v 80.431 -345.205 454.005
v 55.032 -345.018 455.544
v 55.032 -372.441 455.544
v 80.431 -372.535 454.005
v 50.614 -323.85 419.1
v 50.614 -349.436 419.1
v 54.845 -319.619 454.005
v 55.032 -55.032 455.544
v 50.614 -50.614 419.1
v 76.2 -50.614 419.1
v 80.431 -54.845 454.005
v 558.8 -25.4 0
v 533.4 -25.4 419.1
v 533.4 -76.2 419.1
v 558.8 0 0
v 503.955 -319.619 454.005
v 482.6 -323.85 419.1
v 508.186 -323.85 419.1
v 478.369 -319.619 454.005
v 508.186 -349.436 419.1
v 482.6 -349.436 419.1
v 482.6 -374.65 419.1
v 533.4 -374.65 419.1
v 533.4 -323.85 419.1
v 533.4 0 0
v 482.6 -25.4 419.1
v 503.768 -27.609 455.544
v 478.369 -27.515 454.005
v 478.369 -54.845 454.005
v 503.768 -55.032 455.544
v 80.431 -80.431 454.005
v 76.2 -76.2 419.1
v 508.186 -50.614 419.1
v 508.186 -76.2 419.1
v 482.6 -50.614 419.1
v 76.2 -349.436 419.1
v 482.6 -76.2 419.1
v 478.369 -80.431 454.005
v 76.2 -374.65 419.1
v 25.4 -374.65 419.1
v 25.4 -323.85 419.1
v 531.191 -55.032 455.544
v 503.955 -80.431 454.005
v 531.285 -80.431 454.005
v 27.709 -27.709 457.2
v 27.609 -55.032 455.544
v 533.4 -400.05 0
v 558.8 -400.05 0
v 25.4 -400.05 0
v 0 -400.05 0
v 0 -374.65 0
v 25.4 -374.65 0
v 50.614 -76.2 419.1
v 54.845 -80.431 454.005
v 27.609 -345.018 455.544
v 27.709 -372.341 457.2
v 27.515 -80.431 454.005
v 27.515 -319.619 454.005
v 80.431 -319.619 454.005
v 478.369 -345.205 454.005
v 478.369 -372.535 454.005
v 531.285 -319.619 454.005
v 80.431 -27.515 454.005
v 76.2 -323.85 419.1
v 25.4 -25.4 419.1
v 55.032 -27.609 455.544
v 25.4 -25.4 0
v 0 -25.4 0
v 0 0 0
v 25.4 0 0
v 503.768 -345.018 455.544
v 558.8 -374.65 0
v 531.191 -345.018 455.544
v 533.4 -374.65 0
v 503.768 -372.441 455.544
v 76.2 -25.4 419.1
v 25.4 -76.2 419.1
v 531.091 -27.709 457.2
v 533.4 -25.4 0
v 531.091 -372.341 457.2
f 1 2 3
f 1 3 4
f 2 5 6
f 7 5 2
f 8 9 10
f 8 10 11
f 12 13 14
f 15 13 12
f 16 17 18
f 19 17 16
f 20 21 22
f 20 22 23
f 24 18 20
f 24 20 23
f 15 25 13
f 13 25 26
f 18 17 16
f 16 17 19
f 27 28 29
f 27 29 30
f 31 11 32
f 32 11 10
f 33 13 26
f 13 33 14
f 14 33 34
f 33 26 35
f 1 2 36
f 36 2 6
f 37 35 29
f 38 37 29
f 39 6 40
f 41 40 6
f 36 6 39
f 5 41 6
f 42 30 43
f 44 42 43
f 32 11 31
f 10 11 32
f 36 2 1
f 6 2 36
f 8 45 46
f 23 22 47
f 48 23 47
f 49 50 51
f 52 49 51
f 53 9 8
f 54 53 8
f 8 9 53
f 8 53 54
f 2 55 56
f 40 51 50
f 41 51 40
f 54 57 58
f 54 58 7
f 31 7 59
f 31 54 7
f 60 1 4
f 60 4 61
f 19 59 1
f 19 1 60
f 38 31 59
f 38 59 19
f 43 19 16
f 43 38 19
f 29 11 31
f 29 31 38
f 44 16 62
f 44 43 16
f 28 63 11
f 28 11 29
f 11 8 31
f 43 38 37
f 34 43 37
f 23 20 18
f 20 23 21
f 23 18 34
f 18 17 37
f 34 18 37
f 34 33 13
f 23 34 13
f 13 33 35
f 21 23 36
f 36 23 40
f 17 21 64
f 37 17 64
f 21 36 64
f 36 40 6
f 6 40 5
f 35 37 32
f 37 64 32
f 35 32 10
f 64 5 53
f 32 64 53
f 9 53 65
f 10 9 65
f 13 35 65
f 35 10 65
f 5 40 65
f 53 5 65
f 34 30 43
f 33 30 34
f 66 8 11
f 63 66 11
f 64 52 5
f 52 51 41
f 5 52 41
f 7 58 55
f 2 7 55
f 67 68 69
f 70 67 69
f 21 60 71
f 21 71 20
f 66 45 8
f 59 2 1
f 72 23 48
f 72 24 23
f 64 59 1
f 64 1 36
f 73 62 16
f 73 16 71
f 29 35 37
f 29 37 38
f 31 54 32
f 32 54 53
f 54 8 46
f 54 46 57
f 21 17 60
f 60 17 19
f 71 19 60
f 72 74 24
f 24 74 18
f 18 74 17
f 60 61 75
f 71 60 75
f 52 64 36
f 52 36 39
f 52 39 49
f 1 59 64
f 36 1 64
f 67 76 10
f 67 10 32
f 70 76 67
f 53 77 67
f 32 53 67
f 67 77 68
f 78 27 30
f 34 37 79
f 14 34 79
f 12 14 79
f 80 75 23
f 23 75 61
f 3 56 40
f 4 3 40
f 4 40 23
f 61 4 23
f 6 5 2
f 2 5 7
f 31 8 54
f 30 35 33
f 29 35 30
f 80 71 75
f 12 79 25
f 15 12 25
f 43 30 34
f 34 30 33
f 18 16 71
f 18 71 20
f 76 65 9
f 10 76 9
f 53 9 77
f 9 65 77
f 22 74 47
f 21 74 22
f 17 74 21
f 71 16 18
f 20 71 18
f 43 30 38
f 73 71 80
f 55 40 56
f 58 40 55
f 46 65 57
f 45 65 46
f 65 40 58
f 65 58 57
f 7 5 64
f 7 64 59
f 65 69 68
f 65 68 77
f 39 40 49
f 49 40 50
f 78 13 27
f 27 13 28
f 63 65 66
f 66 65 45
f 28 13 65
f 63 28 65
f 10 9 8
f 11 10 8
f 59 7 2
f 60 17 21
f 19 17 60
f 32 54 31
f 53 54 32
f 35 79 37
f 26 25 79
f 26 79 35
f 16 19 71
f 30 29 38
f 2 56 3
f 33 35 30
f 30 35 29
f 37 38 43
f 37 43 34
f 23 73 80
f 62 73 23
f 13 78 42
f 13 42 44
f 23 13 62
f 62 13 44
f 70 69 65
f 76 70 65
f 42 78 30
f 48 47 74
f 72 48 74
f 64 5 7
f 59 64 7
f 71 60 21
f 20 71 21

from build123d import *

# Parameters (mm, degrees)
F1_DEPTH = 558.8
F2_DEPTH = 558.8
F4_DEPTH = 400.051
F5_DEPTH = 400.051


with BuildPart() as f1:
    # F0 (on Right) → F1 (new body)
    with BuildSketch(Plane.YZ):
        Polygon((-50.6140871806, 419.1), (-25.4, 419.1), (-27.7090909091, 457.2), (-55.0315530236, 455.5440932052), align=None)
        Polygon((-76.2, 419.1), (-50.6140871806, 419.1), (-55.0315530236, 455.5440932052), (-80.4308776001, 454.0047402005), align=None)
        Polygon((-323.85, 419.1), (-76.2, 419.1), (-80.4308776001, 454.0047402005), (-319.6191223999, 454.0047402005), align=None)
        Polygon((-349.4359128194, 419.1), (-323.85, 419.1), (-319.6191223999, 454.0047402005), (-345.0184469764, 455.5440932052), align=None)
        Polygon((-374.65, 419.1), (-349.4359128194, 419.1), (-345.0184469764, 455.5440932052), (-372.3409090909, 457.2), align=None)
    extrude(amount=F1_DEPTH)


with BuildPart() as f2:
    # F0 (on Right) → F2 (new body, through all)
    with BuildSketch(Plane.YZ):
        Polygon((-25.4, 0), (0, 0), (-25.4, 419.1), (-50.6140871806, 419.1), (-76.2, 419.1), align=None)
        Polygon((-76.2, 419.1), (-50.6140871806, 419.1), (-55.0315530236, 455.5440932052), (-80.4308776001, 454.0047402005), align=None)
    extrude(amount=F2_DEPTH)


with BuildPart() as f2b:
    # F0 (on Right) → F2, piece 2 (new body, through all)
    with BuildSketch(Plane.YZ):
        Polygon((-374.65, 0), (-323.85, 419.1), (-349.4359128194, 419.1), (-374.65, 419.1), (-400.05, 0), align=None)
        Polygon((-349.4359128194, 419.1), (-323.85, 419.1), (-319.6191223999, 454.0047402005), (-345.0184469764, 455.5440932052), align=None)
    extrude(amount=F2_DEPTH)


with BuildPart() as f4_tool:
    # F3 (on Front) → F4 (new body, through all)
    with BuildSketch(Plane.XZ):
        Polygon((25.4, 0), (533.4, 0), (482.6, 419.1), (76.2, 419.1), align=None)
        Polygon((503.7684469764, 455.5440932052), (531.0909090909, 457.2), (27.7090909091, 457.2), (55.0315530236, 455.5440932052), (80.4308776001, 454.0047402005), (478.3691223999, 454.0047402005), align=None)
        Polygon((533.4, 419.1), (558.8, 0), (558.8, 457.2), (531.0909090909, 457.2), align=None)
        Polygon((25.4, 419.1), (27.7090909091, 457.2), (0, 457.2), (0, 0), align=None)
    extrude(amount=F4_DEPTH)


with BuildPart() as f1_1:
    add(f1.part)

    # F4: cut by f4_tool
    add(f4_tool.part, mode=Mode.SUBTRACT)


with BuildPart() as f2_1:
    add(f2.part)

    # F4: cut by f4_tool
    add(f4_tool.part, mode=Mode.SUBTRACT)


with BuildPart() as f2b_1:
    add(f2b.part)

    # F4: cut by f4_tool
    add(f4_tool.part, mode=Mode.SUBTRACT)


with BuildPart() as f5_tool:
    # F3 (on Front) → F5 (new body, through all)
    with BuildSketch(Plane.XZ):
        Polygon((508.1859128194, 419.1), (533.4, 419.1), (531.0909090909, 457.2), (503.7684469764, 455.5440932052), align=None)
        Polygon((55.0315530236, 455.5440932052), (27.7090909091, 457.2), (25.4, 419.1), (50.6140871806, 419.1), align=None)
        Polygon((76.2, 419.1), (482.6, 419.1), (478.3691223999, 454.0047402005), (80.4308776001, 454.0047402005), align=None)
    extrude(amount=F5_DEPTH)


with BuildPart() as f2_2:
    add(f2_1.part)

    # F5: cut by f5_tool
    add(f5_tool.part, mode=Mode.SUBTRACT)


with BuildPart() as f2b_2:
    add(f2b_1.part)

    # F5: cut by f5_tool
    add(f5_tool.part, mode=Mode.SUBTRACT)


with BuildPart() as f1_2:
    add(f1_1.part)

    # F6: cut F2b, F2
    add(f2b_2.part, mode=Mode.SUBTRACT)
    add(f2_2.part, mode=Mode.SUBTRACT)


solid = Compound([f2_2.part, f2b_2.part, f1_2.part])
